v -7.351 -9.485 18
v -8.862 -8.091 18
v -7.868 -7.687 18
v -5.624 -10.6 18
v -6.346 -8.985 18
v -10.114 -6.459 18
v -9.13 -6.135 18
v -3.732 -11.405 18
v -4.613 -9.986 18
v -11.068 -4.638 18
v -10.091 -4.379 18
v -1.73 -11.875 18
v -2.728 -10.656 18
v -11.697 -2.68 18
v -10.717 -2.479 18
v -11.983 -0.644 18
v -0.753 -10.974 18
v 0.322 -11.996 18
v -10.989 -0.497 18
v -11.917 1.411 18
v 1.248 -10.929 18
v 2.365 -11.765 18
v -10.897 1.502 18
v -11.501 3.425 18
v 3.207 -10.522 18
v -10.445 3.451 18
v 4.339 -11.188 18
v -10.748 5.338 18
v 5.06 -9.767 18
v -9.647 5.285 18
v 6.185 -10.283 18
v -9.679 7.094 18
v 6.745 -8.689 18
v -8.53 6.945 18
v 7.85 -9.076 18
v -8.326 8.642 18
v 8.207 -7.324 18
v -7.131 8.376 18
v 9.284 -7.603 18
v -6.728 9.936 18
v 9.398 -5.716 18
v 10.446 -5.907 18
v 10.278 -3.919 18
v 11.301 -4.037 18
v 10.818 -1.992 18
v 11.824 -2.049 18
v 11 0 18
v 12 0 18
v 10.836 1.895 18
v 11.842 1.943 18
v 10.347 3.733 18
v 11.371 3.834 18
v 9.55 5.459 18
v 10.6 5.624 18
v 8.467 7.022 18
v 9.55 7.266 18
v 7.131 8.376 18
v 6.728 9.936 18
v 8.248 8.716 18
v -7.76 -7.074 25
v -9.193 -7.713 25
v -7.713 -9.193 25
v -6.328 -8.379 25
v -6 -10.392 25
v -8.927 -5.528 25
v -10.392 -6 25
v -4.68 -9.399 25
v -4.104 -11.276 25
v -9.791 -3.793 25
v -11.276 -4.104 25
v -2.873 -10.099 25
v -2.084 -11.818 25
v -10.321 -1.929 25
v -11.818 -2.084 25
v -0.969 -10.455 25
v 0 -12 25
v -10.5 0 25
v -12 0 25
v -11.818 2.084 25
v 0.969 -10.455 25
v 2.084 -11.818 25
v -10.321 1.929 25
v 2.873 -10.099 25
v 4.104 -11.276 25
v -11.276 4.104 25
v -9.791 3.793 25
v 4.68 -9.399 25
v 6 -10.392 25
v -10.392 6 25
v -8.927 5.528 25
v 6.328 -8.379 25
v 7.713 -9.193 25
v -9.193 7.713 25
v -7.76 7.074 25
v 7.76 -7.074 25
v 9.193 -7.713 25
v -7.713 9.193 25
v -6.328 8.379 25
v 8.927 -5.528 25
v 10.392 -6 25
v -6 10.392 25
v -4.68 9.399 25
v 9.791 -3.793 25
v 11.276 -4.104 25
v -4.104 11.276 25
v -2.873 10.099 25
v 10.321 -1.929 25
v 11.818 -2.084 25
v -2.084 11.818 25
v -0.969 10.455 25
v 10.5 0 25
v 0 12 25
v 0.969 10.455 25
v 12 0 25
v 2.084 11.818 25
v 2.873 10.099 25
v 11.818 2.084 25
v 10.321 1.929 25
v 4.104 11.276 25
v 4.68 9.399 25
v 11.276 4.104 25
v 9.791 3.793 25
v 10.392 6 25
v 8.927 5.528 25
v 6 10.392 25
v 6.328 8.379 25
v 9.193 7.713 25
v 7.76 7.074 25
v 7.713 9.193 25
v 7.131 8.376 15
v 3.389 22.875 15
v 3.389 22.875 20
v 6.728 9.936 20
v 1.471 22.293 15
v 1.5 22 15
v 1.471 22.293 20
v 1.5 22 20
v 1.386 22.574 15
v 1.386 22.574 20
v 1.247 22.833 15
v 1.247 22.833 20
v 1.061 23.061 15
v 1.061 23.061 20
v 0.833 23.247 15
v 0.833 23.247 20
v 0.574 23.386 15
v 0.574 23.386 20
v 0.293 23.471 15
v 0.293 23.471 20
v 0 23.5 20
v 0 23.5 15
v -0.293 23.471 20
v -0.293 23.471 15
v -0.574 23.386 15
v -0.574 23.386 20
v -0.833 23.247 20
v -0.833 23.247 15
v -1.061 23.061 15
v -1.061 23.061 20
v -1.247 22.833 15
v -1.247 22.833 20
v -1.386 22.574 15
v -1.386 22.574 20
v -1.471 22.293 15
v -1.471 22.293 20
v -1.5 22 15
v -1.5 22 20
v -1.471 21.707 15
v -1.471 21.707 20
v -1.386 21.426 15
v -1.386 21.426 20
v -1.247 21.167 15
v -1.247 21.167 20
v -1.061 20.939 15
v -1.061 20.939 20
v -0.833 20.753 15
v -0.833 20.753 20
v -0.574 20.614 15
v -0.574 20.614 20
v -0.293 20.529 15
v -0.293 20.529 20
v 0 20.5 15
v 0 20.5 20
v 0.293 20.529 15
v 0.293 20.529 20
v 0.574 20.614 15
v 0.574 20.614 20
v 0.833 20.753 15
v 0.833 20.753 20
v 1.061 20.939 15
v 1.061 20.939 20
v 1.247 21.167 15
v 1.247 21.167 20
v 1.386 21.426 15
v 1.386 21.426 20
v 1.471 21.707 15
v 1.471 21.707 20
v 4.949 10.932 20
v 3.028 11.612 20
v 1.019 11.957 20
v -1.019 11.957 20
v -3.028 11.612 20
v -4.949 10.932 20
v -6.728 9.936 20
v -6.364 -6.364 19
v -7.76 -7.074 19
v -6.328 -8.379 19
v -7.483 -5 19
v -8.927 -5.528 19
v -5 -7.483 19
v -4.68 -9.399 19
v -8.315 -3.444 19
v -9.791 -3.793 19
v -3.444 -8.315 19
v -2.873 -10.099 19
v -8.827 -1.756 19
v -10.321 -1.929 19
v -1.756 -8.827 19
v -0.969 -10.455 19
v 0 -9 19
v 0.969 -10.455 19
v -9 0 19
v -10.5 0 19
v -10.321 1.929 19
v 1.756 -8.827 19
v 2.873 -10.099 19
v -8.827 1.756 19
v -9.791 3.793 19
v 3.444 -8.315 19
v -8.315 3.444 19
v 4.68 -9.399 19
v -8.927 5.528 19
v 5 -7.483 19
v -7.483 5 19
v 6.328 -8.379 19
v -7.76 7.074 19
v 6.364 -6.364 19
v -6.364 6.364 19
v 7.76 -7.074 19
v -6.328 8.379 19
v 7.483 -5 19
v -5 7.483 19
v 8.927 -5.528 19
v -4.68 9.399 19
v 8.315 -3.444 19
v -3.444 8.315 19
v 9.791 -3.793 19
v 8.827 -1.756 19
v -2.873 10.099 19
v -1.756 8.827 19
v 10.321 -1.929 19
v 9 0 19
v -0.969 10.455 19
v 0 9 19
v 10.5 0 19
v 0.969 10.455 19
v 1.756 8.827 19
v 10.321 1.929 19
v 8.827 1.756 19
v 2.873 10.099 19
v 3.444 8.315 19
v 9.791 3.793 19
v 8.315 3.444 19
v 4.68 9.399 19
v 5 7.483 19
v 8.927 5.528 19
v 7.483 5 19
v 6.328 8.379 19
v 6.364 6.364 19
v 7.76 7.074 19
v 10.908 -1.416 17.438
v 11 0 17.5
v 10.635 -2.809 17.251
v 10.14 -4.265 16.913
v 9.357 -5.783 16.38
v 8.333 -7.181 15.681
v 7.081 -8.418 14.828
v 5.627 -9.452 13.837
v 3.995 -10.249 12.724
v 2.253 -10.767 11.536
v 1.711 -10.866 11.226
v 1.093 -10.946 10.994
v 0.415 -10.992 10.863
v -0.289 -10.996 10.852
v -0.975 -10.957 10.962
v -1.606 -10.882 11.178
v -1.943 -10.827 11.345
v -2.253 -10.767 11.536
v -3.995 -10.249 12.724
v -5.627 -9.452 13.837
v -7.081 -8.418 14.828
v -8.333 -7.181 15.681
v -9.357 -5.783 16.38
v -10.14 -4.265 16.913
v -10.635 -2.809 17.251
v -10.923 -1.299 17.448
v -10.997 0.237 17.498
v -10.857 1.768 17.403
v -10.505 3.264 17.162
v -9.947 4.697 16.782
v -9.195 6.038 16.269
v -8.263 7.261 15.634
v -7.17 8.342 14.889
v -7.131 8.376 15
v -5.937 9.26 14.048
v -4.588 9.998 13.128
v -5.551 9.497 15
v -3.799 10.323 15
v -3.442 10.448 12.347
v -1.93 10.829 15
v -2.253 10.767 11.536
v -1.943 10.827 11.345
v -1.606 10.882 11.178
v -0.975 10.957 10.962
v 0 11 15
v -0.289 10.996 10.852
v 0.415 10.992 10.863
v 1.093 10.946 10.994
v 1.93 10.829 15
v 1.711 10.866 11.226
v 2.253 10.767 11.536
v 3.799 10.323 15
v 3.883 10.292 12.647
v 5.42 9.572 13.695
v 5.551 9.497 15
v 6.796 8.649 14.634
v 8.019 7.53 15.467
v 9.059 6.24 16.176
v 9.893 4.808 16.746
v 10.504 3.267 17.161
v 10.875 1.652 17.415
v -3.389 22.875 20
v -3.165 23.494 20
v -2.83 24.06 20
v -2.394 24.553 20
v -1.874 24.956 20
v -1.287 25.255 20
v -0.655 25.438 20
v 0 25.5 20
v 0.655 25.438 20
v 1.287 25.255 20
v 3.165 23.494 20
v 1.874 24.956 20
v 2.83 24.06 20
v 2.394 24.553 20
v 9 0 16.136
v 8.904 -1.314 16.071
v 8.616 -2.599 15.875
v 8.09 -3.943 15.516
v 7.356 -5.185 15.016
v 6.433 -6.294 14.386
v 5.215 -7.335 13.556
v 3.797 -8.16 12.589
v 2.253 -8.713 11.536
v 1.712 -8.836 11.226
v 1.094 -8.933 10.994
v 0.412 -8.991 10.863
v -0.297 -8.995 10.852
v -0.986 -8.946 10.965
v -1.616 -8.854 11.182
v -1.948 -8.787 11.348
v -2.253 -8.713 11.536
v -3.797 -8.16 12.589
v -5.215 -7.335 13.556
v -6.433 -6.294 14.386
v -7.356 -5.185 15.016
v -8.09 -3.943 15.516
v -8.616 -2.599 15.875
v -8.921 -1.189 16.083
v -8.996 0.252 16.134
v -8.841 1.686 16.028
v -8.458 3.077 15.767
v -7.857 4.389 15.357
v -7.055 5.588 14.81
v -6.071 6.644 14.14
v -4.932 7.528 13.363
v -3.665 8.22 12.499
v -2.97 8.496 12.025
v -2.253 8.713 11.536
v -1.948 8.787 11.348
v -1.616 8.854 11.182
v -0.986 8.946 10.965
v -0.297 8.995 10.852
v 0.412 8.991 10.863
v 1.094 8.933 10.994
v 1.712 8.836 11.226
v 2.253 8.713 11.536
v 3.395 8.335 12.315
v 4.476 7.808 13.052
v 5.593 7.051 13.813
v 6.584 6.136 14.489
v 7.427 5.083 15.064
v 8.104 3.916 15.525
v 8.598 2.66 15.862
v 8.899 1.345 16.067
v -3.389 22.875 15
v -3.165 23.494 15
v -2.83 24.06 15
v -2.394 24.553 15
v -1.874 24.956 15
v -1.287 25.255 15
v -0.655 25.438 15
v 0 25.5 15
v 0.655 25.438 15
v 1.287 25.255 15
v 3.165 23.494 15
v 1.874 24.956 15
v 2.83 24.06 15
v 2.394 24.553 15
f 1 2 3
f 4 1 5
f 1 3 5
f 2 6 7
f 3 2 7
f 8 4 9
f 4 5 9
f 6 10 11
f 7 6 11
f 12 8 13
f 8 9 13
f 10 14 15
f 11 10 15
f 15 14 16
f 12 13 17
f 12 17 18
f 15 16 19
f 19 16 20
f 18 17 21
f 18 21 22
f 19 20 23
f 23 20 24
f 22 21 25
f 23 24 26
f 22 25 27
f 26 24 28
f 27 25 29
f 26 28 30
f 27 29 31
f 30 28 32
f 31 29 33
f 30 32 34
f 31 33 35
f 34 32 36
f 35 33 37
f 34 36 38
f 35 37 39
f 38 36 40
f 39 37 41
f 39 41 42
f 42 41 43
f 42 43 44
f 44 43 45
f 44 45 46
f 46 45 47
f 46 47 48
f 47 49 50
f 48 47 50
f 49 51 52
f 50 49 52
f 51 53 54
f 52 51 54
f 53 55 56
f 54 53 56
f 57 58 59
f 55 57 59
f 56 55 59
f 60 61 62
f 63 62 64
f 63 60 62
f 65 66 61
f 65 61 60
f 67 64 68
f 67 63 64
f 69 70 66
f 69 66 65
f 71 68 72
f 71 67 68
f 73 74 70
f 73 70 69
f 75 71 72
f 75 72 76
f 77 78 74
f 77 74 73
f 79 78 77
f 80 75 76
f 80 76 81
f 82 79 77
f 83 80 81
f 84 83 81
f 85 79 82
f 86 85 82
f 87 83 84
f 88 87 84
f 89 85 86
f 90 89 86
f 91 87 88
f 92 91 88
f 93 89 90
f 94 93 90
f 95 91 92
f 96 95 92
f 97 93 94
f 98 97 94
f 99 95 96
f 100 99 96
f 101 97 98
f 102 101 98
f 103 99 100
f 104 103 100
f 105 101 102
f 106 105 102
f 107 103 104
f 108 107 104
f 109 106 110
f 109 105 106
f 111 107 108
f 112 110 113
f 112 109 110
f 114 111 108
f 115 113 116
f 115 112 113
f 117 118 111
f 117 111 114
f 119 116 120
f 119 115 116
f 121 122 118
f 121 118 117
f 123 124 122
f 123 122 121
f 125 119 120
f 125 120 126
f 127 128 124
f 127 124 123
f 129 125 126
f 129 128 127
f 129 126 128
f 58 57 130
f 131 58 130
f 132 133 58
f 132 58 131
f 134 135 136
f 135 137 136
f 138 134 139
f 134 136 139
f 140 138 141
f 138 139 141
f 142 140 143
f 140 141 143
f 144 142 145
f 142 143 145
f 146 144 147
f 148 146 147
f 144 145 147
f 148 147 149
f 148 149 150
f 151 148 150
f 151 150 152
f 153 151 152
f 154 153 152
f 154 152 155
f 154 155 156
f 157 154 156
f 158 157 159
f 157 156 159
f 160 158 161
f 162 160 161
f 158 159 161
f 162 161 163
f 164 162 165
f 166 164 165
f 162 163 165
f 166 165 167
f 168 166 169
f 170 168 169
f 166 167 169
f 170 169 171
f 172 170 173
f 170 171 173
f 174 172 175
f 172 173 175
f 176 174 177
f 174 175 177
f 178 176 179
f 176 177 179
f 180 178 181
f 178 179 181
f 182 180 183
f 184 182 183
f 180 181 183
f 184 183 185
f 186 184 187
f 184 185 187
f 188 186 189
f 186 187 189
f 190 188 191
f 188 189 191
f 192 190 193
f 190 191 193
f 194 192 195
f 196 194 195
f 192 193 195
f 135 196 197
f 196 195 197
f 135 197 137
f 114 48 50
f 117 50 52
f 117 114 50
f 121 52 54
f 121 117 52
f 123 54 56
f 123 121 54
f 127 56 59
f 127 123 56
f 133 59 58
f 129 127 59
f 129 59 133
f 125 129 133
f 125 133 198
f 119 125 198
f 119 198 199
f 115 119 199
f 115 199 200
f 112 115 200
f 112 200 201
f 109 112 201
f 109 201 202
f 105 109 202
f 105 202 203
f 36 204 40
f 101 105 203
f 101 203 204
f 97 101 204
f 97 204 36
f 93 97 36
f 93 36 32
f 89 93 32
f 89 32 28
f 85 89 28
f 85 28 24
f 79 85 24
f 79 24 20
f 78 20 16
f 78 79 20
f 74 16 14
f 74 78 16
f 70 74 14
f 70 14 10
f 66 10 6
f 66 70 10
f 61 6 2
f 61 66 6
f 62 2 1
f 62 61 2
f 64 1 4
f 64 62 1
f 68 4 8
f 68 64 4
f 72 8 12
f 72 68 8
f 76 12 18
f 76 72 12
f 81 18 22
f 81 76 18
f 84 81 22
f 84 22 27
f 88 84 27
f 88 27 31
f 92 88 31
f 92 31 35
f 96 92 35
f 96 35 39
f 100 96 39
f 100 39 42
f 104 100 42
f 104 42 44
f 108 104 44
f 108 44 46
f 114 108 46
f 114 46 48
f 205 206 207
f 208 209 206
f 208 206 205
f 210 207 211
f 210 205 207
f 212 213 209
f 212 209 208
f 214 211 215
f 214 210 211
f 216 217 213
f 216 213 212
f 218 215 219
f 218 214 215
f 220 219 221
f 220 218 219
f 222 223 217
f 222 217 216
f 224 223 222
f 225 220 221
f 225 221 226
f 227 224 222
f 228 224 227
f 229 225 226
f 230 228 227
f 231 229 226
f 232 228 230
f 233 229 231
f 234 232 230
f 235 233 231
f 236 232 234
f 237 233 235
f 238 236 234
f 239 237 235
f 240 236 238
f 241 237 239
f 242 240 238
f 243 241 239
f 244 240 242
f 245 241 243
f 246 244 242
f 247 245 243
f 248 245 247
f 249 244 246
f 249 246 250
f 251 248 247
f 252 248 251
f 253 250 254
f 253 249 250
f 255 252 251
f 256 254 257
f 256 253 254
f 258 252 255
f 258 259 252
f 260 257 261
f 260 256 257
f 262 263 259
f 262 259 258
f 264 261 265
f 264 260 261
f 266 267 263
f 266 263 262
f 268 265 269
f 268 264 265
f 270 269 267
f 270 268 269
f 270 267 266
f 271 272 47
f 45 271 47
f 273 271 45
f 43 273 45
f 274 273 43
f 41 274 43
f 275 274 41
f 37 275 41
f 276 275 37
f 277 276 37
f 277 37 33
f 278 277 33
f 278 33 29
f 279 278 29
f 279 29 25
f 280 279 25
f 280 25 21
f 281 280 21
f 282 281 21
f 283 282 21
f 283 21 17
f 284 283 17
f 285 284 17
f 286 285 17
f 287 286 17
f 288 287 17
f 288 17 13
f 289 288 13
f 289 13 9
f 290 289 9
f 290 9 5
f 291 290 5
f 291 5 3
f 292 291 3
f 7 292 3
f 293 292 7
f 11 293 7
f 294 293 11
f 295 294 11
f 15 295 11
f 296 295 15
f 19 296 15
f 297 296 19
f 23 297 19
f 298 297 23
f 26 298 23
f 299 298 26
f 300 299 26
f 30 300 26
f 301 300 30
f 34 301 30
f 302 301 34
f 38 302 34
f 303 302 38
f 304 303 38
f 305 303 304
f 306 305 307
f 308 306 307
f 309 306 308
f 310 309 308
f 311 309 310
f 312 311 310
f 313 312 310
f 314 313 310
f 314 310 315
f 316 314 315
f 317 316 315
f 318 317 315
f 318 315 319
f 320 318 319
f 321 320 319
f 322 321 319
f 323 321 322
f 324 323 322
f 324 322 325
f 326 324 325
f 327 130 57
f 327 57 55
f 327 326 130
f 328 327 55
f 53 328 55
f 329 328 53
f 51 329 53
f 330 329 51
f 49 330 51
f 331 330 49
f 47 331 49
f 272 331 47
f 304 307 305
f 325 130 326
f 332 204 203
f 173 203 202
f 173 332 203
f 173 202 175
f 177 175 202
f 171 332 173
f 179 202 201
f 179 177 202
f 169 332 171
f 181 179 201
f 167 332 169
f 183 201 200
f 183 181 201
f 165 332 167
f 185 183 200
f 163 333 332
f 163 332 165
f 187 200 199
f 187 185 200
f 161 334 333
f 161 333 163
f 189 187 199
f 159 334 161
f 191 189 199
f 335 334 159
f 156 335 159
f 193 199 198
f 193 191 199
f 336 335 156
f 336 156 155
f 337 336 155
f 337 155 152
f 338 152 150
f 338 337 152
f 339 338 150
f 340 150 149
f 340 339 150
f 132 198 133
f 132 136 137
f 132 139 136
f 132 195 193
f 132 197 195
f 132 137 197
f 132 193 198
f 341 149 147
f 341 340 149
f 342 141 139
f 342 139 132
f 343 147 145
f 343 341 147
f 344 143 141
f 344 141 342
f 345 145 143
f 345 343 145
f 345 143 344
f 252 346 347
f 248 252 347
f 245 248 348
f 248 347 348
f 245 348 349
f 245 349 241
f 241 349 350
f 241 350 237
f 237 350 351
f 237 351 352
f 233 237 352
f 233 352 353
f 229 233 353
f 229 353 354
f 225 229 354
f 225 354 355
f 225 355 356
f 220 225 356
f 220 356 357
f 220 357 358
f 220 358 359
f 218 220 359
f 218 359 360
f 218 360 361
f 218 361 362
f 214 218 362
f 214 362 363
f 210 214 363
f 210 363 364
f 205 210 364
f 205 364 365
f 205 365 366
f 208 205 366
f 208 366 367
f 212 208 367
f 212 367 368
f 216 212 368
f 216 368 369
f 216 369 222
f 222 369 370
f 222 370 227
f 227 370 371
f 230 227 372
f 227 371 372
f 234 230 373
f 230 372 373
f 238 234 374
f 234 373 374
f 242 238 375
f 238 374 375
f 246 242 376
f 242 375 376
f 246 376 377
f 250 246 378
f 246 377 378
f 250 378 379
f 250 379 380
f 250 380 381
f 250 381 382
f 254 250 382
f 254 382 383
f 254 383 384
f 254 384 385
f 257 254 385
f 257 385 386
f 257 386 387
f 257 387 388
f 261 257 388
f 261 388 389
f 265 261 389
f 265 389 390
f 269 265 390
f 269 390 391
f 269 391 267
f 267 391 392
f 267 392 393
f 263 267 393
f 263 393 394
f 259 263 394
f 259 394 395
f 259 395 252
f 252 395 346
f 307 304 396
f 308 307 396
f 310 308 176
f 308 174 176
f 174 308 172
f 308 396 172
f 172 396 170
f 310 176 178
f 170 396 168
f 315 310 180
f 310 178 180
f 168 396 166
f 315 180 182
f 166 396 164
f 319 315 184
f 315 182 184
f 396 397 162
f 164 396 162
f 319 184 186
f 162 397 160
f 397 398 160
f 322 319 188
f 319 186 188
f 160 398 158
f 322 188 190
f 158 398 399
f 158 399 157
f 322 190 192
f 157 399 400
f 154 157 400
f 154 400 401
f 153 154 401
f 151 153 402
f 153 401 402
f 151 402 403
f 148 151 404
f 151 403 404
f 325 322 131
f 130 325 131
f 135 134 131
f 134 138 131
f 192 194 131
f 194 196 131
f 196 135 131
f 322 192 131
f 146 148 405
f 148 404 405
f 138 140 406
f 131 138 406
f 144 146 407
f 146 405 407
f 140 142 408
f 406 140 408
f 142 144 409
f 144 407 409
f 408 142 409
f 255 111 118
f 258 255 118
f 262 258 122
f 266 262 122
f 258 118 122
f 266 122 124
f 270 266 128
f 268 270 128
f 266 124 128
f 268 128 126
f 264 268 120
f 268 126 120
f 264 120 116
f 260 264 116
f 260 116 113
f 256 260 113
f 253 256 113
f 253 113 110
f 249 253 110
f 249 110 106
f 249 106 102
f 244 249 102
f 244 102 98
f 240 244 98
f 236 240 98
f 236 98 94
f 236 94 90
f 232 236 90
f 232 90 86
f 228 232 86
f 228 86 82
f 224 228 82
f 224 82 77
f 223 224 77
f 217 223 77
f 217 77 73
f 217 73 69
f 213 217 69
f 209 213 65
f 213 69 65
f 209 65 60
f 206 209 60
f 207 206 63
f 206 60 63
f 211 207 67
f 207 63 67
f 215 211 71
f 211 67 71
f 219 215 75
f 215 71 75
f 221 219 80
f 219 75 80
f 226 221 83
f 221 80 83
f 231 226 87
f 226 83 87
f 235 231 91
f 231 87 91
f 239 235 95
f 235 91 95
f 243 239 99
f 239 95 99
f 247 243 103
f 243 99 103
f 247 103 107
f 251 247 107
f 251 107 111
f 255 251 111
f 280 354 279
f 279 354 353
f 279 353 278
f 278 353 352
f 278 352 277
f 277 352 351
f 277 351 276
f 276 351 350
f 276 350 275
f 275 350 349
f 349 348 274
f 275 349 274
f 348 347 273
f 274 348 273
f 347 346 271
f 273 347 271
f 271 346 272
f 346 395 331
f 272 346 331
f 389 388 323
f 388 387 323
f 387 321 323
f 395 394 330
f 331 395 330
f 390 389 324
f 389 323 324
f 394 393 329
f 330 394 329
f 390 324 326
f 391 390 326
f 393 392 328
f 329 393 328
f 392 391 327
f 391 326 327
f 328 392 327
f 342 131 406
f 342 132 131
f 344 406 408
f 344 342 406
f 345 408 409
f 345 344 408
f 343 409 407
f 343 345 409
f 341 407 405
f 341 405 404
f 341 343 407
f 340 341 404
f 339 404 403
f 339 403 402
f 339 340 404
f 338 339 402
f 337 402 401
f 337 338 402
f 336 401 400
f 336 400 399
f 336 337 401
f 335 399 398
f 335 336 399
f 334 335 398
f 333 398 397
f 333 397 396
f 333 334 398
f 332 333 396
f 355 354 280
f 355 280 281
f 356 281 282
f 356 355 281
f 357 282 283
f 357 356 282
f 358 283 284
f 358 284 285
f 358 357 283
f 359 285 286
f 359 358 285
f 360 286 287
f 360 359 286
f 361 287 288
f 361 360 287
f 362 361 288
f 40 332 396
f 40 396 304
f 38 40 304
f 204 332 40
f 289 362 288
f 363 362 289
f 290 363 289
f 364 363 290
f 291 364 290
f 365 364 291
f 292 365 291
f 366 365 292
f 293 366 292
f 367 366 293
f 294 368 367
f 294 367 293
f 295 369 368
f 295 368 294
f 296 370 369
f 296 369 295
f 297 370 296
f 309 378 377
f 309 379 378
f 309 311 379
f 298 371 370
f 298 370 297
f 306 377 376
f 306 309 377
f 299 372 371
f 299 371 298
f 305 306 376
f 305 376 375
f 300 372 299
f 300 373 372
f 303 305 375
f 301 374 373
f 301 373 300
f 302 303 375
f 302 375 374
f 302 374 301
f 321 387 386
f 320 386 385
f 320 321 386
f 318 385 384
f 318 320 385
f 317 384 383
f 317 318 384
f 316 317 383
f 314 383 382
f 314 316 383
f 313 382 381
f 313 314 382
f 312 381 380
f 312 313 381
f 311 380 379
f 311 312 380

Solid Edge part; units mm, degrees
sketch "Sketch1" plane through (0, 0, 0) normal (0, 0, 1) x (1, 0, 0)
  circle A0 centre (0, 0) radius 9
  circle A1 centre (0, 0) radius 11
extrude "Protrusion1" add sketch "Sketch1" along normal blind 25
sketch "Sketch2" plane through (0, 0, 20) normal (0, 0, 1) x (1, 0, 0)
  circle A0 centre (0, 22) radius 1.5
  line L0 (-3.389, 22.8746) -> (-7.1308, 8.3756)
  arc A1 (-7.1308, 8.3756) -> (7.1308, 8.3756) centre (0, 0) cw
  line L1 (7.1308, 8.3756) -> (3.389, 22.8746)
  arc A2 (3.389, 22.8746) -> (-3.389, 22.8746) centre (0, 22) ccw
extrude "Extrusionsausprägung_3" add sketch "Sketch2" against normal blind 5
sketch "Sketch3" plane through (0, 0, 0) normal (0, -1, 0) x (1, 0, 0)
  line L0 (-11, 17.5) -> (0, 10)
  line L1 (0, 10) -> (11, 17.5)
  dimension "D1" = 10
  dimension "D2" = 7.5
  dimension "D3" = 7.5
extrude "Cutout1" cut sketch "Sketch3" along normal through all and the other way through all material side at (-5.5282, 0, 13.7087)
fillet "Verrundung_2" radius 4 2 edges at (0, -10, 10) (0, 10, 10)
sketch "Sketch4" plane through (0, 0, 25) normal (0, 0, 1) x (1, 0, 0)
  circle A0 centre (0, 0) radius 12
  circle A1 centre (0, 0) radius 9
extrude "Extrusionsausprägung_4" add sketch "Sketch4" against normal blind 7
sketch "Sketch5" plane through (0, 0, 25) normal (0, 0, 1) x (1, 0, 0)
  circle A0 centre (0, 0) radius 10.5
  dimension "D1" = 21
extrude "Extrusionsausschnitt_7" cut sketch "Sketch5" against normal blind 6
properties part number "094" material "Aluminiumlegierung:3.0205, Al 99.0, EN-AW 1200"
